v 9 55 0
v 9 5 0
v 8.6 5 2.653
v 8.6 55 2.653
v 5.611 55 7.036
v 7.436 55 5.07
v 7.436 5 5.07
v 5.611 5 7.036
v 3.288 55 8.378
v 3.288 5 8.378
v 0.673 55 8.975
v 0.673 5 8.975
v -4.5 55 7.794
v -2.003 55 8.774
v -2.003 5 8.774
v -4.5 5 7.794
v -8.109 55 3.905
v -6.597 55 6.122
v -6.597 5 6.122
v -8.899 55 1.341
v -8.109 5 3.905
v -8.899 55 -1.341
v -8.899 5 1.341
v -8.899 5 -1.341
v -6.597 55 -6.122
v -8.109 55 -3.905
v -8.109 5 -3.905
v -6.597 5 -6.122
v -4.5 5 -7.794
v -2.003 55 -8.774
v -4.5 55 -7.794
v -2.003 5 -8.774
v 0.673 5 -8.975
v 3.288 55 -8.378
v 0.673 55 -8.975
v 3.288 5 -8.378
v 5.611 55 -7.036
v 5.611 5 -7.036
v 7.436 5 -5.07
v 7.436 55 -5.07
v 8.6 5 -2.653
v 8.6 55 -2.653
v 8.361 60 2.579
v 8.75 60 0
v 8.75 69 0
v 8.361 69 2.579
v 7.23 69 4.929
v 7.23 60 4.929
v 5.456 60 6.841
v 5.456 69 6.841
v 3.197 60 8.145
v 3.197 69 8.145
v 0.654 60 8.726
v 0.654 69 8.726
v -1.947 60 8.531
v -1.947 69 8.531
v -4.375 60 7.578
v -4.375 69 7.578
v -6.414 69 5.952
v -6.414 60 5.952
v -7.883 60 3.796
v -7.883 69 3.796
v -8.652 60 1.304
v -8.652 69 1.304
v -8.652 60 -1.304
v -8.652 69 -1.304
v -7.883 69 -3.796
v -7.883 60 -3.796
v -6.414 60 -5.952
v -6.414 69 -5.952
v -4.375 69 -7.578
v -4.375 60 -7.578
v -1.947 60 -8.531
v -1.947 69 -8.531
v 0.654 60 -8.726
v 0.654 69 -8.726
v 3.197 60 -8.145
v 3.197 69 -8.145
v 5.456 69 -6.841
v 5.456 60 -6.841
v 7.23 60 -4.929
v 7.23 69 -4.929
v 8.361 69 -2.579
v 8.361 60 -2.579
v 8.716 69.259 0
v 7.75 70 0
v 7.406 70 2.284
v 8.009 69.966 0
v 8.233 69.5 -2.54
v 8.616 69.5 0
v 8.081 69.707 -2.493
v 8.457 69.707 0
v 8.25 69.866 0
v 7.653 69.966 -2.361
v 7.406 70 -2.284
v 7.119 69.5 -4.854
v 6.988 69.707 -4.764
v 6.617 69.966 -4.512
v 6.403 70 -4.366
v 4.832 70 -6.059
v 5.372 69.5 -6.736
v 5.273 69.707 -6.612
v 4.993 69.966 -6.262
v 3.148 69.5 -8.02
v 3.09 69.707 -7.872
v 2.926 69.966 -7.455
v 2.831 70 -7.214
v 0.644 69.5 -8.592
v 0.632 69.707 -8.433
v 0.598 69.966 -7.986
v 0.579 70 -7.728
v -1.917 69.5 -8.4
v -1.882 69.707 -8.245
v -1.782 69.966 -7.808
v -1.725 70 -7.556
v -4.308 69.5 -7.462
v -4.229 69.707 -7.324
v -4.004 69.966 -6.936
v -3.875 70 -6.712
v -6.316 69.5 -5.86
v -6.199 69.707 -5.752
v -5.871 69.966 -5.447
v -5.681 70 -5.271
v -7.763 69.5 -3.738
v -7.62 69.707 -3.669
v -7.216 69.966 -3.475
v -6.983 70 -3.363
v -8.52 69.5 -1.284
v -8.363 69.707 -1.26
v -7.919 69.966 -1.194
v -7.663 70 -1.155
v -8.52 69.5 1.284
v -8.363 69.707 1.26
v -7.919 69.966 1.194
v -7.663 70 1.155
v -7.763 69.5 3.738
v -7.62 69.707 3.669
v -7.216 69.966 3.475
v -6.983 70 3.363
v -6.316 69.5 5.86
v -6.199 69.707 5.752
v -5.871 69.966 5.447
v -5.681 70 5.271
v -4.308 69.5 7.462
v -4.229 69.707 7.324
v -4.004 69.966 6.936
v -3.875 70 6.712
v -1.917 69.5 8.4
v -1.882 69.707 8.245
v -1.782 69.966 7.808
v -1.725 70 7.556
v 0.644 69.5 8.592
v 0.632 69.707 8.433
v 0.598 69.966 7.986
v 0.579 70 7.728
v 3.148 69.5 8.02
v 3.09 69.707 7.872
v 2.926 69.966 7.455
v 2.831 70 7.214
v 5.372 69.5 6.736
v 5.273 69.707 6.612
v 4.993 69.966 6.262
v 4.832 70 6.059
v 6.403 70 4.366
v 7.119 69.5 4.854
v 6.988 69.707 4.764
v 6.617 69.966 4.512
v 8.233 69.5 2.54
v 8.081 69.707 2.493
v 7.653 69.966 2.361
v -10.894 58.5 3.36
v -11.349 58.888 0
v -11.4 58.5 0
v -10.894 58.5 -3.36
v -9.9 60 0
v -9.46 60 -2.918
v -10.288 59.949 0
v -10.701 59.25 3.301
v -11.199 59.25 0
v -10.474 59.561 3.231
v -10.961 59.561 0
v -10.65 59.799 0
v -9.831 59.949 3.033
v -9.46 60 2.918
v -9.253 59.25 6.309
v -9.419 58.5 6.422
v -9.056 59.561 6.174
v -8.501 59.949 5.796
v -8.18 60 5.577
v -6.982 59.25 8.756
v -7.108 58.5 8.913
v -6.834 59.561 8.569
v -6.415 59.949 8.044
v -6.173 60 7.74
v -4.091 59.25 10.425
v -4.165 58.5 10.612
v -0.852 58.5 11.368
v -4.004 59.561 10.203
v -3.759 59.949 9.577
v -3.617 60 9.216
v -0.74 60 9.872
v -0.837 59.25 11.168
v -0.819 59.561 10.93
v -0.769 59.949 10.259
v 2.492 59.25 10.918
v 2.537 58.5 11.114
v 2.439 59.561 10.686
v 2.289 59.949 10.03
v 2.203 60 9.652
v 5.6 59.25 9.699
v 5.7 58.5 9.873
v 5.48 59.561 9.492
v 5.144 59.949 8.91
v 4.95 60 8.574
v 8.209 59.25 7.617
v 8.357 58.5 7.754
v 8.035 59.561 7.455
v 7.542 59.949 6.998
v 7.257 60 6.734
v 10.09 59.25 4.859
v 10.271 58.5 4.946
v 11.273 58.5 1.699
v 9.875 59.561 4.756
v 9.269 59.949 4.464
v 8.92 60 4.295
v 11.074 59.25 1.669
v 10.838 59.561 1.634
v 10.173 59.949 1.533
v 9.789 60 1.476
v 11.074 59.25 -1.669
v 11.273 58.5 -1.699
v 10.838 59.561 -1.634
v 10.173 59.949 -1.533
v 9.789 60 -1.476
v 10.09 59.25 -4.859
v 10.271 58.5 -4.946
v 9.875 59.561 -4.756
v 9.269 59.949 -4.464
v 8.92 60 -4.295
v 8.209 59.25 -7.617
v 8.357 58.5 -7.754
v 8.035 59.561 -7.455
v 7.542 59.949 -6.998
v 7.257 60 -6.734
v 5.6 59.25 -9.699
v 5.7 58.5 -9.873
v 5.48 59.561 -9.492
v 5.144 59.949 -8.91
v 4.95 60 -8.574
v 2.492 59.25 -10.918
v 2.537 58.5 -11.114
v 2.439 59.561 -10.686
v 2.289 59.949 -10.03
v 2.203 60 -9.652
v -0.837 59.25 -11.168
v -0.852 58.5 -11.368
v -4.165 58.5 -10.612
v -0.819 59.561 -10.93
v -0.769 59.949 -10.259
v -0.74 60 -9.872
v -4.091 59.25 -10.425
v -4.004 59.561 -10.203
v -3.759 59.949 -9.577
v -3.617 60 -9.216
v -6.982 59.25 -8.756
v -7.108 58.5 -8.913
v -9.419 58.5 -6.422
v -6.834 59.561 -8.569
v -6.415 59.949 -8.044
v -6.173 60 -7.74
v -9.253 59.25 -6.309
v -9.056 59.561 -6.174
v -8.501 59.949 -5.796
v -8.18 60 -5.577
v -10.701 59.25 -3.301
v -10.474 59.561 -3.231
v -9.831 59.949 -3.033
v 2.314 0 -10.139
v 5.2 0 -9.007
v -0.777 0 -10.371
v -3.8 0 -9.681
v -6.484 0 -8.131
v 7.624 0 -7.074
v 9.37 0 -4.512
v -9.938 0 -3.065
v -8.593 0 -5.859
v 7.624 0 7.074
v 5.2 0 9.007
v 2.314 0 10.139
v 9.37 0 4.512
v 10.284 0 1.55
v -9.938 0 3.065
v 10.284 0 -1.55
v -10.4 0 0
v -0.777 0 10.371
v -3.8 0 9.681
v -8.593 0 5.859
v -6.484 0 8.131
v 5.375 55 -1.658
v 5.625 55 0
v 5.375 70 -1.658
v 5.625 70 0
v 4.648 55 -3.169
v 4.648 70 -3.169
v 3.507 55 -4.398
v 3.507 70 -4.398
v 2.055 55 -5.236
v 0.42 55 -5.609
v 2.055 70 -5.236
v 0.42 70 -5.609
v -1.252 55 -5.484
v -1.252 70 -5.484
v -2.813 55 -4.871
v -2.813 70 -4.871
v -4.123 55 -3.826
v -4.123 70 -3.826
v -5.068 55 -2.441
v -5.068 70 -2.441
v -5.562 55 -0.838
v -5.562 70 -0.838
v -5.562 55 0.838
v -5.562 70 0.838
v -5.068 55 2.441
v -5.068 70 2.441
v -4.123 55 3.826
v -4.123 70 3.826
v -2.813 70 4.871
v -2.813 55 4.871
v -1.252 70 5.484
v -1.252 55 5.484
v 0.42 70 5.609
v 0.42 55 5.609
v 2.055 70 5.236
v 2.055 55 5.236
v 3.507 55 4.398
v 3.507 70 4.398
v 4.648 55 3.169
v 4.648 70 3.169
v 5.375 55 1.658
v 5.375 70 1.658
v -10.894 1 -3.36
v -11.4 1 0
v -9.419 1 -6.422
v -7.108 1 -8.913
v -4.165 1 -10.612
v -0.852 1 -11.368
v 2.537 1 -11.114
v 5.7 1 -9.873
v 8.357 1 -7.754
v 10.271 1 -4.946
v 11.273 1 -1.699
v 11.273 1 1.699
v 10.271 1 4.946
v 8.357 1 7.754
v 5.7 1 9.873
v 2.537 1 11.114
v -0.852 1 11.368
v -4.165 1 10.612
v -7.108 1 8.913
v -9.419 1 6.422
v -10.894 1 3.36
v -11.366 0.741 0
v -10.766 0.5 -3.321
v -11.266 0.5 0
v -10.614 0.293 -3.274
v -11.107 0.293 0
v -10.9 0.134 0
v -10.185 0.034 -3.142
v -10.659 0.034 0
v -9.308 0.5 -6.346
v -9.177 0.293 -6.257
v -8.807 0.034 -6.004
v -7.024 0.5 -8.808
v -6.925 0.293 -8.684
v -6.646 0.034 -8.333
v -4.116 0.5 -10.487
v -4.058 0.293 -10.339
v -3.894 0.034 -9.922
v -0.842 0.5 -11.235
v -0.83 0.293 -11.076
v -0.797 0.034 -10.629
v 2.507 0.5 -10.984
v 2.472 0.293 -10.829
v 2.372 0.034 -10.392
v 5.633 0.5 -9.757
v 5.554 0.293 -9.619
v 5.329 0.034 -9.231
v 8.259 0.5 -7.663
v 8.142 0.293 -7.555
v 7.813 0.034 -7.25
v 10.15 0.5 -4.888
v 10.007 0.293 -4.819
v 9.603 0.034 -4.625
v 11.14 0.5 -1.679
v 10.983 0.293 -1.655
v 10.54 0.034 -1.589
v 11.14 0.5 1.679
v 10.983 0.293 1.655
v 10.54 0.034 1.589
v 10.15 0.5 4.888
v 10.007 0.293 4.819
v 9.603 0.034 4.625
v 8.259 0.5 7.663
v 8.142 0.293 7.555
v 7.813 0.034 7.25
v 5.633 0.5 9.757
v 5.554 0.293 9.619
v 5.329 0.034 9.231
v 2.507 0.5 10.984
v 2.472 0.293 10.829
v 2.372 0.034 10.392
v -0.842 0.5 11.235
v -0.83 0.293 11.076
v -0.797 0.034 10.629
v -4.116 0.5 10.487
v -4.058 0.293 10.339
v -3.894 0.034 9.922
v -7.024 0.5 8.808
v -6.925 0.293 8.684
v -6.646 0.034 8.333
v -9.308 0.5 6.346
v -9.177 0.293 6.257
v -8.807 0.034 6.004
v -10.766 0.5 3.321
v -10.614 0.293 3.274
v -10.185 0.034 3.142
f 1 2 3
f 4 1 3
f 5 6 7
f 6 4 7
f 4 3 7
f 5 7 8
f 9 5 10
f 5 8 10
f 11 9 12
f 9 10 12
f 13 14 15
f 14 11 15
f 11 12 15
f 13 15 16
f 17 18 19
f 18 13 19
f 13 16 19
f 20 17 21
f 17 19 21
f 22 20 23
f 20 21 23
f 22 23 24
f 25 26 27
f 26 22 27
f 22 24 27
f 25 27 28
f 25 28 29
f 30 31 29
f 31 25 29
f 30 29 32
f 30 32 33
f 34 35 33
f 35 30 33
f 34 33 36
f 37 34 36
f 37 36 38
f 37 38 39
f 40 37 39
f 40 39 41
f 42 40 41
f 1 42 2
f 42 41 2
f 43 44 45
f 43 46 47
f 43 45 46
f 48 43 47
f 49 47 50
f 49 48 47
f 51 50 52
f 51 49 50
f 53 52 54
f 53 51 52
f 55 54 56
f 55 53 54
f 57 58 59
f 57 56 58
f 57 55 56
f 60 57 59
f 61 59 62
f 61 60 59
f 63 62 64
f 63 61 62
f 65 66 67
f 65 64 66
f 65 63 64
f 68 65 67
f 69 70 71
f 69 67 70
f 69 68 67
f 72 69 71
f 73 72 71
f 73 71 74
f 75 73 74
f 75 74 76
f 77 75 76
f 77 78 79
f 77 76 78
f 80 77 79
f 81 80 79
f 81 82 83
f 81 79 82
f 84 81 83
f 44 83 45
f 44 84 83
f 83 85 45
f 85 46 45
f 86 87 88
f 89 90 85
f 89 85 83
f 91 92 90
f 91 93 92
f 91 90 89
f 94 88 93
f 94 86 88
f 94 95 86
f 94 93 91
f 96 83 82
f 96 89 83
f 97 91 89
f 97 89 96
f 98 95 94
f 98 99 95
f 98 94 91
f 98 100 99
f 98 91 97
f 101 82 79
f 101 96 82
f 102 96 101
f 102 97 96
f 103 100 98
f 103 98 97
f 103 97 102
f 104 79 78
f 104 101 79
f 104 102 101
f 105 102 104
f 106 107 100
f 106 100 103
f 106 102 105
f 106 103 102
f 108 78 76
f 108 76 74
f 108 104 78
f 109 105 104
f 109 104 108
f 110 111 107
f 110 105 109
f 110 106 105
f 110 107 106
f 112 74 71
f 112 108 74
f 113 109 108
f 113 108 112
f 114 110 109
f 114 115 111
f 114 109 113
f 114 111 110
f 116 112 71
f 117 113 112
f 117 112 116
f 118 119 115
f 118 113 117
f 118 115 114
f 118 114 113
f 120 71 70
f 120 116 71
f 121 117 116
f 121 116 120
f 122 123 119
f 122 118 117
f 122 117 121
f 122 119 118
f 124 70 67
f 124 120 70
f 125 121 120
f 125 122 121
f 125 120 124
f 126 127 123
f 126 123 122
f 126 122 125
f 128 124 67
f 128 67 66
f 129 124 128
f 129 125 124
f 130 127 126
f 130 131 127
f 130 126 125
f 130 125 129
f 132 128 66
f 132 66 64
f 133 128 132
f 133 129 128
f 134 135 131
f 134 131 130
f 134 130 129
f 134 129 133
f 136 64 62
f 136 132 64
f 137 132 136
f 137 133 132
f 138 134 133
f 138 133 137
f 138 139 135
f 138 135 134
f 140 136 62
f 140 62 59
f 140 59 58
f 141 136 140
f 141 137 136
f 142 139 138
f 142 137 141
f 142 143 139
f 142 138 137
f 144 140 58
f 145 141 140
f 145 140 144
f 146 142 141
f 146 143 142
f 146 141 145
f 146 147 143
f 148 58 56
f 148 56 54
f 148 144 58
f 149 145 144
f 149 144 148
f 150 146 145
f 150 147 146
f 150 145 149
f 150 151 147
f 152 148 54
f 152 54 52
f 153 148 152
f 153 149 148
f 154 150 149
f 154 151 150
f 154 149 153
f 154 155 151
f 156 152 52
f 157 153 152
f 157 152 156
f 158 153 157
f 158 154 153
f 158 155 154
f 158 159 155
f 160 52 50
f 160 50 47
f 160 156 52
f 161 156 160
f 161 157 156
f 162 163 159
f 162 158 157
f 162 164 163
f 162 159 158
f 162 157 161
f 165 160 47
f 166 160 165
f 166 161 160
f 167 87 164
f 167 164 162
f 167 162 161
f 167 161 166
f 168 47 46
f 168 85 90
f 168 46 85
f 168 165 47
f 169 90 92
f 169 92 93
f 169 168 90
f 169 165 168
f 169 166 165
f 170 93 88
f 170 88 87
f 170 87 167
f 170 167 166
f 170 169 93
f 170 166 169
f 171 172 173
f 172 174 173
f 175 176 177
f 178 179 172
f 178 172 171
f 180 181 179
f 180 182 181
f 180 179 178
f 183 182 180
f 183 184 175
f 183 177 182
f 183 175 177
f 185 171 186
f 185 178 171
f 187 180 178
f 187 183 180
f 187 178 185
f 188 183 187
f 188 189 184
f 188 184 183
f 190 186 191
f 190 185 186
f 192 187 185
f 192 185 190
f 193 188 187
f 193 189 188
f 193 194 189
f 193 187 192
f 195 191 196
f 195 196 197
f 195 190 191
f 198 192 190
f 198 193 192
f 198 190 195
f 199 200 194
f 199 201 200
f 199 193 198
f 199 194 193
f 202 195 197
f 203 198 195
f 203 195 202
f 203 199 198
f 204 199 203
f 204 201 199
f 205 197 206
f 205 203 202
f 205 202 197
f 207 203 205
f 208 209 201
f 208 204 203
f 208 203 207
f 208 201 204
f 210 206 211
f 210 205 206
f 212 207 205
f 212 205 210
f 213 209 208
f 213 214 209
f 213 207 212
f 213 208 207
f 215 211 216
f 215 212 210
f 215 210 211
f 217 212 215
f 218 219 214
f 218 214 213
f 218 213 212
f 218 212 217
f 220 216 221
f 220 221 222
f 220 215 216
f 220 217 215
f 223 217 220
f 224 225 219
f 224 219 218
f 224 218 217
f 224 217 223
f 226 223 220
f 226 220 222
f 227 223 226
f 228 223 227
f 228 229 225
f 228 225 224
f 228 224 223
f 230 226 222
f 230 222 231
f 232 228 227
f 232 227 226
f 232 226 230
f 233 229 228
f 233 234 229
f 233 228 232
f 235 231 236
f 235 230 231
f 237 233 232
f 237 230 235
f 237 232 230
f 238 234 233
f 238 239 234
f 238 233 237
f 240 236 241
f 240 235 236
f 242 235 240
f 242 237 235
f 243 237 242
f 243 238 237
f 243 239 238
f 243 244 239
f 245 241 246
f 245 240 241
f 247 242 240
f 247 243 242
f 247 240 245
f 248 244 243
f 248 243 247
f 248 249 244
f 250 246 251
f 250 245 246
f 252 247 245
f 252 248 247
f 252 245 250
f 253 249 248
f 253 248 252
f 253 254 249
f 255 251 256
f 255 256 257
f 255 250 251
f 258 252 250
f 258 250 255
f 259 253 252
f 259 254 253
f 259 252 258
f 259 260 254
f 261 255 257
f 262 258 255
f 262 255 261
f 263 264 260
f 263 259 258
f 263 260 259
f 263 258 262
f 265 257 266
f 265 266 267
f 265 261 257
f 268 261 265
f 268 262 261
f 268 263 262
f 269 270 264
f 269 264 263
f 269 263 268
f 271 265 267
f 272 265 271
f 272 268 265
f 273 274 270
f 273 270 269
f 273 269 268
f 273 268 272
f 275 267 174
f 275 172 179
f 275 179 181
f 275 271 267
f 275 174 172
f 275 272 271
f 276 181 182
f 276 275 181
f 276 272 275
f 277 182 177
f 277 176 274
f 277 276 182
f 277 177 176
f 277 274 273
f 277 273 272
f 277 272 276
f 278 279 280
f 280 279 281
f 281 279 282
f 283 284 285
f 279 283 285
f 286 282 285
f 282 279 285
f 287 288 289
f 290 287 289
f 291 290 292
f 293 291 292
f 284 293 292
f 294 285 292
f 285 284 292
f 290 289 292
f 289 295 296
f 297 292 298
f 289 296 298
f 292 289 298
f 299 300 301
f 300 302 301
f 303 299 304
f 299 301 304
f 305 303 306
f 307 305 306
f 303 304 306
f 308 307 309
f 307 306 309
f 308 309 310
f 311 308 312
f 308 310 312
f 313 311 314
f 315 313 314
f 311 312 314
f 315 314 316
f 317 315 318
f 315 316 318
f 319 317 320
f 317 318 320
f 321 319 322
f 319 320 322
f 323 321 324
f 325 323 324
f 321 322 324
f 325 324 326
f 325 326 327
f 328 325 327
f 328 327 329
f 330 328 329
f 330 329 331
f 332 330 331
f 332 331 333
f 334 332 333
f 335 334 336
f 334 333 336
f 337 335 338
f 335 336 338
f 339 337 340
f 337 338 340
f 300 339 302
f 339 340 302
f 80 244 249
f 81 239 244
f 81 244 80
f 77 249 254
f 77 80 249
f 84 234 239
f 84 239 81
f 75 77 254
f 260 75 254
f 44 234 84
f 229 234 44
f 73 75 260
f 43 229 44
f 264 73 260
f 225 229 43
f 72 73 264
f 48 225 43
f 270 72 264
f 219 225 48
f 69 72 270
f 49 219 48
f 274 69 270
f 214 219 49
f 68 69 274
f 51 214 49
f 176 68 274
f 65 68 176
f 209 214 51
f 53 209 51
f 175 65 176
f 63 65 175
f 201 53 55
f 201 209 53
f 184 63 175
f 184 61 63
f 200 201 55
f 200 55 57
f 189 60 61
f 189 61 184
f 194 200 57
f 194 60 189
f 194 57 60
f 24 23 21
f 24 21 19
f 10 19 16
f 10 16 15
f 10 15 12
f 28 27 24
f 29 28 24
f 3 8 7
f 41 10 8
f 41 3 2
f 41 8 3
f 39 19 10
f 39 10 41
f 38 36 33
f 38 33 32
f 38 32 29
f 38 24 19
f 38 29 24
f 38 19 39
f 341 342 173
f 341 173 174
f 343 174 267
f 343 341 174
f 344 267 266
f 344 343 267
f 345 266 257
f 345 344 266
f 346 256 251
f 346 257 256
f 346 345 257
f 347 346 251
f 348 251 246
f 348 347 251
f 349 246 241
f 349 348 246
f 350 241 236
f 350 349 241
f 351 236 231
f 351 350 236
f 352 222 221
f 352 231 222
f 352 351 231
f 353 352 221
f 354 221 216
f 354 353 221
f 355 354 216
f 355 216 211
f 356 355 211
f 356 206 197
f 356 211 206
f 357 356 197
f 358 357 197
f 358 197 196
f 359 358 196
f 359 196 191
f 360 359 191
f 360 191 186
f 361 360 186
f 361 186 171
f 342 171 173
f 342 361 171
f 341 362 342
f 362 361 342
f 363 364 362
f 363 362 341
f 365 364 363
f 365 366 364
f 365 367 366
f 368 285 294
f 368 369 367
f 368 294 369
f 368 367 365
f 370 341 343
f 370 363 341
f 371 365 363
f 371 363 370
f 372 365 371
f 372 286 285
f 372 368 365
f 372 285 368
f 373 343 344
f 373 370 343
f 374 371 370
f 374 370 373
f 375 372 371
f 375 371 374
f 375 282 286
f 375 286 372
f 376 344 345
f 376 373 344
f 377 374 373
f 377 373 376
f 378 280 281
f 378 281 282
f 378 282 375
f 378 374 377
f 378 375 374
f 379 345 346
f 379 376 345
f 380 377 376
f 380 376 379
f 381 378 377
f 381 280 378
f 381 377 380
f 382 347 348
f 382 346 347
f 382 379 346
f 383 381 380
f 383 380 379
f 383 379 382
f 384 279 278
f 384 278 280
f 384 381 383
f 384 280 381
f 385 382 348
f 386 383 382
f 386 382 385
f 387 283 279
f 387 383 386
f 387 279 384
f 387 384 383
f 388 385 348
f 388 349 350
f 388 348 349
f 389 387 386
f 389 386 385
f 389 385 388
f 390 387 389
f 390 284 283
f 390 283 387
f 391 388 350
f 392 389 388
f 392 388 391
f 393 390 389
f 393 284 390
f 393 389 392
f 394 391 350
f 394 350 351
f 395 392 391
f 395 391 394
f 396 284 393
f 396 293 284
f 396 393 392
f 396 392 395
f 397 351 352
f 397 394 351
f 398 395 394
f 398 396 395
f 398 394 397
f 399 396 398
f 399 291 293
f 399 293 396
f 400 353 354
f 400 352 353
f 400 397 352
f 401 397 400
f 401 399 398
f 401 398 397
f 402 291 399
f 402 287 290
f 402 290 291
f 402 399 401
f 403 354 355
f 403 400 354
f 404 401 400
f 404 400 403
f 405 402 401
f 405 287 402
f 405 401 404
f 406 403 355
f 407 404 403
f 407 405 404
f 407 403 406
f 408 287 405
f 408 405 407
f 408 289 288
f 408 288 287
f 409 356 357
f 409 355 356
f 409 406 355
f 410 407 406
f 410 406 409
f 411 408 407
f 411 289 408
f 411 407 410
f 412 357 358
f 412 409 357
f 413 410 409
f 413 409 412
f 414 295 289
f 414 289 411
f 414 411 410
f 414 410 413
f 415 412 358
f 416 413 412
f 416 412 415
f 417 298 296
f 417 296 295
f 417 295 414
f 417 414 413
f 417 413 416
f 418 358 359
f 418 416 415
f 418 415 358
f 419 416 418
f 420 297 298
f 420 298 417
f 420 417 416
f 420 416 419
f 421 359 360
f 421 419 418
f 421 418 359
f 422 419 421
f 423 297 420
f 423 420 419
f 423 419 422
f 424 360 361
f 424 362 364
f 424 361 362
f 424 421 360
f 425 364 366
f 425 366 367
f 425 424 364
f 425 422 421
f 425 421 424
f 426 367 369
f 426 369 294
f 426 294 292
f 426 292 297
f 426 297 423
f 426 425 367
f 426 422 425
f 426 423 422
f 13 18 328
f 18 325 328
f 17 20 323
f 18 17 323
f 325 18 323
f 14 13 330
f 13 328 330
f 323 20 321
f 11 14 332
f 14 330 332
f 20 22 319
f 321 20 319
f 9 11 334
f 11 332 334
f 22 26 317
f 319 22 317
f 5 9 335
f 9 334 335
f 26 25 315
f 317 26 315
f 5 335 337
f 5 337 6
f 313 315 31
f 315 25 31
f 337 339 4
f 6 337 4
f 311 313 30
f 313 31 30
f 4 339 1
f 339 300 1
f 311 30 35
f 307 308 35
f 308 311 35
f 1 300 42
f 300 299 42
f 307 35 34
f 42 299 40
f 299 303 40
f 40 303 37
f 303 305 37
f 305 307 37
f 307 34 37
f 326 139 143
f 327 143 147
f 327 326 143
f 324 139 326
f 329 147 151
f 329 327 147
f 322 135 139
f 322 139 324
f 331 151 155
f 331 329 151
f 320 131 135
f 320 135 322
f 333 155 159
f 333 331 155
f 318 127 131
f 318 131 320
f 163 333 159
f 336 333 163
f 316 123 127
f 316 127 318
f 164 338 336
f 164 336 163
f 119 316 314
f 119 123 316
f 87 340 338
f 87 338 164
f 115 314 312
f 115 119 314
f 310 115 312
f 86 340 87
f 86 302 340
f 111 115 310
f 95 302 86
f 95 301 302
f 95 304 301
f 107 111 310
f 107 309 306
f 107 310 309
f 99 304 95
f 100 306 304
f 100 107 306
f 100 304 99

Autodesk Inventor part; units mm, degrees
ref_plane "YZ Plane" through (0, 0, 0) normal (1, 0, 0) x (0, 1, 0)
ref_plane "XZ Plane" through (0, 0, 0) normal (0, 1, 0) x (-1, 0, 0)
ref_plane "XY Plane" through (0, 0, 0) normal (0, 0, 1) x (1, 0, 0)
sketch "Sketch1" plane through (0, 0, 0) normal (0, 1, 0) x (-1, 0, 0)
  circle A0 centre (0, 0) radius 11.4
  dimension "d2" = 22.8
extrude "Extrusion1" add sketch "Sketch1" along normal blind 60
sketch "Sketch2" plane through (0, 60, 0) normal (0, 1, 0) x (1, 0, 0)
  circle A0 centre (0, 0) radius 8.75
  dimension "d3" = 17.5
extrude "Extrusion2" add sketch "Sketch2" along normal blind 10
fillet "Fillet1" radius 1.5 1 edges at (11.4, 60, 0)
thread "Thread1" size "M18x2.5" class "6g" standard "ANSI Metric M Profile" full length
sketch "Sketch3" plane through (0, 70, 0) normal (0, 1, 0) x (1, 0, 0)
  circle A0 centre (0, 0) radius 5.625
  dimension "d9" = 11.25
extrude "Extrusion3" cut sketch "Sketch3" against normal blind 65
fillet "Fillet2" radius 1 2 edges at (11.4, 0, 0) (-8.75, 70, 0)
sketch "Sketch4" plane through (0, 5, 0) normal (0, 1, 0) x (1, 0, 0)
  circle A0 centre (0, 0) radius 9
  dimension "d13" = 18
extrude "Extrusion4" cut sketch "Sketch4" along normal blind 50
properties part number "Vial"
